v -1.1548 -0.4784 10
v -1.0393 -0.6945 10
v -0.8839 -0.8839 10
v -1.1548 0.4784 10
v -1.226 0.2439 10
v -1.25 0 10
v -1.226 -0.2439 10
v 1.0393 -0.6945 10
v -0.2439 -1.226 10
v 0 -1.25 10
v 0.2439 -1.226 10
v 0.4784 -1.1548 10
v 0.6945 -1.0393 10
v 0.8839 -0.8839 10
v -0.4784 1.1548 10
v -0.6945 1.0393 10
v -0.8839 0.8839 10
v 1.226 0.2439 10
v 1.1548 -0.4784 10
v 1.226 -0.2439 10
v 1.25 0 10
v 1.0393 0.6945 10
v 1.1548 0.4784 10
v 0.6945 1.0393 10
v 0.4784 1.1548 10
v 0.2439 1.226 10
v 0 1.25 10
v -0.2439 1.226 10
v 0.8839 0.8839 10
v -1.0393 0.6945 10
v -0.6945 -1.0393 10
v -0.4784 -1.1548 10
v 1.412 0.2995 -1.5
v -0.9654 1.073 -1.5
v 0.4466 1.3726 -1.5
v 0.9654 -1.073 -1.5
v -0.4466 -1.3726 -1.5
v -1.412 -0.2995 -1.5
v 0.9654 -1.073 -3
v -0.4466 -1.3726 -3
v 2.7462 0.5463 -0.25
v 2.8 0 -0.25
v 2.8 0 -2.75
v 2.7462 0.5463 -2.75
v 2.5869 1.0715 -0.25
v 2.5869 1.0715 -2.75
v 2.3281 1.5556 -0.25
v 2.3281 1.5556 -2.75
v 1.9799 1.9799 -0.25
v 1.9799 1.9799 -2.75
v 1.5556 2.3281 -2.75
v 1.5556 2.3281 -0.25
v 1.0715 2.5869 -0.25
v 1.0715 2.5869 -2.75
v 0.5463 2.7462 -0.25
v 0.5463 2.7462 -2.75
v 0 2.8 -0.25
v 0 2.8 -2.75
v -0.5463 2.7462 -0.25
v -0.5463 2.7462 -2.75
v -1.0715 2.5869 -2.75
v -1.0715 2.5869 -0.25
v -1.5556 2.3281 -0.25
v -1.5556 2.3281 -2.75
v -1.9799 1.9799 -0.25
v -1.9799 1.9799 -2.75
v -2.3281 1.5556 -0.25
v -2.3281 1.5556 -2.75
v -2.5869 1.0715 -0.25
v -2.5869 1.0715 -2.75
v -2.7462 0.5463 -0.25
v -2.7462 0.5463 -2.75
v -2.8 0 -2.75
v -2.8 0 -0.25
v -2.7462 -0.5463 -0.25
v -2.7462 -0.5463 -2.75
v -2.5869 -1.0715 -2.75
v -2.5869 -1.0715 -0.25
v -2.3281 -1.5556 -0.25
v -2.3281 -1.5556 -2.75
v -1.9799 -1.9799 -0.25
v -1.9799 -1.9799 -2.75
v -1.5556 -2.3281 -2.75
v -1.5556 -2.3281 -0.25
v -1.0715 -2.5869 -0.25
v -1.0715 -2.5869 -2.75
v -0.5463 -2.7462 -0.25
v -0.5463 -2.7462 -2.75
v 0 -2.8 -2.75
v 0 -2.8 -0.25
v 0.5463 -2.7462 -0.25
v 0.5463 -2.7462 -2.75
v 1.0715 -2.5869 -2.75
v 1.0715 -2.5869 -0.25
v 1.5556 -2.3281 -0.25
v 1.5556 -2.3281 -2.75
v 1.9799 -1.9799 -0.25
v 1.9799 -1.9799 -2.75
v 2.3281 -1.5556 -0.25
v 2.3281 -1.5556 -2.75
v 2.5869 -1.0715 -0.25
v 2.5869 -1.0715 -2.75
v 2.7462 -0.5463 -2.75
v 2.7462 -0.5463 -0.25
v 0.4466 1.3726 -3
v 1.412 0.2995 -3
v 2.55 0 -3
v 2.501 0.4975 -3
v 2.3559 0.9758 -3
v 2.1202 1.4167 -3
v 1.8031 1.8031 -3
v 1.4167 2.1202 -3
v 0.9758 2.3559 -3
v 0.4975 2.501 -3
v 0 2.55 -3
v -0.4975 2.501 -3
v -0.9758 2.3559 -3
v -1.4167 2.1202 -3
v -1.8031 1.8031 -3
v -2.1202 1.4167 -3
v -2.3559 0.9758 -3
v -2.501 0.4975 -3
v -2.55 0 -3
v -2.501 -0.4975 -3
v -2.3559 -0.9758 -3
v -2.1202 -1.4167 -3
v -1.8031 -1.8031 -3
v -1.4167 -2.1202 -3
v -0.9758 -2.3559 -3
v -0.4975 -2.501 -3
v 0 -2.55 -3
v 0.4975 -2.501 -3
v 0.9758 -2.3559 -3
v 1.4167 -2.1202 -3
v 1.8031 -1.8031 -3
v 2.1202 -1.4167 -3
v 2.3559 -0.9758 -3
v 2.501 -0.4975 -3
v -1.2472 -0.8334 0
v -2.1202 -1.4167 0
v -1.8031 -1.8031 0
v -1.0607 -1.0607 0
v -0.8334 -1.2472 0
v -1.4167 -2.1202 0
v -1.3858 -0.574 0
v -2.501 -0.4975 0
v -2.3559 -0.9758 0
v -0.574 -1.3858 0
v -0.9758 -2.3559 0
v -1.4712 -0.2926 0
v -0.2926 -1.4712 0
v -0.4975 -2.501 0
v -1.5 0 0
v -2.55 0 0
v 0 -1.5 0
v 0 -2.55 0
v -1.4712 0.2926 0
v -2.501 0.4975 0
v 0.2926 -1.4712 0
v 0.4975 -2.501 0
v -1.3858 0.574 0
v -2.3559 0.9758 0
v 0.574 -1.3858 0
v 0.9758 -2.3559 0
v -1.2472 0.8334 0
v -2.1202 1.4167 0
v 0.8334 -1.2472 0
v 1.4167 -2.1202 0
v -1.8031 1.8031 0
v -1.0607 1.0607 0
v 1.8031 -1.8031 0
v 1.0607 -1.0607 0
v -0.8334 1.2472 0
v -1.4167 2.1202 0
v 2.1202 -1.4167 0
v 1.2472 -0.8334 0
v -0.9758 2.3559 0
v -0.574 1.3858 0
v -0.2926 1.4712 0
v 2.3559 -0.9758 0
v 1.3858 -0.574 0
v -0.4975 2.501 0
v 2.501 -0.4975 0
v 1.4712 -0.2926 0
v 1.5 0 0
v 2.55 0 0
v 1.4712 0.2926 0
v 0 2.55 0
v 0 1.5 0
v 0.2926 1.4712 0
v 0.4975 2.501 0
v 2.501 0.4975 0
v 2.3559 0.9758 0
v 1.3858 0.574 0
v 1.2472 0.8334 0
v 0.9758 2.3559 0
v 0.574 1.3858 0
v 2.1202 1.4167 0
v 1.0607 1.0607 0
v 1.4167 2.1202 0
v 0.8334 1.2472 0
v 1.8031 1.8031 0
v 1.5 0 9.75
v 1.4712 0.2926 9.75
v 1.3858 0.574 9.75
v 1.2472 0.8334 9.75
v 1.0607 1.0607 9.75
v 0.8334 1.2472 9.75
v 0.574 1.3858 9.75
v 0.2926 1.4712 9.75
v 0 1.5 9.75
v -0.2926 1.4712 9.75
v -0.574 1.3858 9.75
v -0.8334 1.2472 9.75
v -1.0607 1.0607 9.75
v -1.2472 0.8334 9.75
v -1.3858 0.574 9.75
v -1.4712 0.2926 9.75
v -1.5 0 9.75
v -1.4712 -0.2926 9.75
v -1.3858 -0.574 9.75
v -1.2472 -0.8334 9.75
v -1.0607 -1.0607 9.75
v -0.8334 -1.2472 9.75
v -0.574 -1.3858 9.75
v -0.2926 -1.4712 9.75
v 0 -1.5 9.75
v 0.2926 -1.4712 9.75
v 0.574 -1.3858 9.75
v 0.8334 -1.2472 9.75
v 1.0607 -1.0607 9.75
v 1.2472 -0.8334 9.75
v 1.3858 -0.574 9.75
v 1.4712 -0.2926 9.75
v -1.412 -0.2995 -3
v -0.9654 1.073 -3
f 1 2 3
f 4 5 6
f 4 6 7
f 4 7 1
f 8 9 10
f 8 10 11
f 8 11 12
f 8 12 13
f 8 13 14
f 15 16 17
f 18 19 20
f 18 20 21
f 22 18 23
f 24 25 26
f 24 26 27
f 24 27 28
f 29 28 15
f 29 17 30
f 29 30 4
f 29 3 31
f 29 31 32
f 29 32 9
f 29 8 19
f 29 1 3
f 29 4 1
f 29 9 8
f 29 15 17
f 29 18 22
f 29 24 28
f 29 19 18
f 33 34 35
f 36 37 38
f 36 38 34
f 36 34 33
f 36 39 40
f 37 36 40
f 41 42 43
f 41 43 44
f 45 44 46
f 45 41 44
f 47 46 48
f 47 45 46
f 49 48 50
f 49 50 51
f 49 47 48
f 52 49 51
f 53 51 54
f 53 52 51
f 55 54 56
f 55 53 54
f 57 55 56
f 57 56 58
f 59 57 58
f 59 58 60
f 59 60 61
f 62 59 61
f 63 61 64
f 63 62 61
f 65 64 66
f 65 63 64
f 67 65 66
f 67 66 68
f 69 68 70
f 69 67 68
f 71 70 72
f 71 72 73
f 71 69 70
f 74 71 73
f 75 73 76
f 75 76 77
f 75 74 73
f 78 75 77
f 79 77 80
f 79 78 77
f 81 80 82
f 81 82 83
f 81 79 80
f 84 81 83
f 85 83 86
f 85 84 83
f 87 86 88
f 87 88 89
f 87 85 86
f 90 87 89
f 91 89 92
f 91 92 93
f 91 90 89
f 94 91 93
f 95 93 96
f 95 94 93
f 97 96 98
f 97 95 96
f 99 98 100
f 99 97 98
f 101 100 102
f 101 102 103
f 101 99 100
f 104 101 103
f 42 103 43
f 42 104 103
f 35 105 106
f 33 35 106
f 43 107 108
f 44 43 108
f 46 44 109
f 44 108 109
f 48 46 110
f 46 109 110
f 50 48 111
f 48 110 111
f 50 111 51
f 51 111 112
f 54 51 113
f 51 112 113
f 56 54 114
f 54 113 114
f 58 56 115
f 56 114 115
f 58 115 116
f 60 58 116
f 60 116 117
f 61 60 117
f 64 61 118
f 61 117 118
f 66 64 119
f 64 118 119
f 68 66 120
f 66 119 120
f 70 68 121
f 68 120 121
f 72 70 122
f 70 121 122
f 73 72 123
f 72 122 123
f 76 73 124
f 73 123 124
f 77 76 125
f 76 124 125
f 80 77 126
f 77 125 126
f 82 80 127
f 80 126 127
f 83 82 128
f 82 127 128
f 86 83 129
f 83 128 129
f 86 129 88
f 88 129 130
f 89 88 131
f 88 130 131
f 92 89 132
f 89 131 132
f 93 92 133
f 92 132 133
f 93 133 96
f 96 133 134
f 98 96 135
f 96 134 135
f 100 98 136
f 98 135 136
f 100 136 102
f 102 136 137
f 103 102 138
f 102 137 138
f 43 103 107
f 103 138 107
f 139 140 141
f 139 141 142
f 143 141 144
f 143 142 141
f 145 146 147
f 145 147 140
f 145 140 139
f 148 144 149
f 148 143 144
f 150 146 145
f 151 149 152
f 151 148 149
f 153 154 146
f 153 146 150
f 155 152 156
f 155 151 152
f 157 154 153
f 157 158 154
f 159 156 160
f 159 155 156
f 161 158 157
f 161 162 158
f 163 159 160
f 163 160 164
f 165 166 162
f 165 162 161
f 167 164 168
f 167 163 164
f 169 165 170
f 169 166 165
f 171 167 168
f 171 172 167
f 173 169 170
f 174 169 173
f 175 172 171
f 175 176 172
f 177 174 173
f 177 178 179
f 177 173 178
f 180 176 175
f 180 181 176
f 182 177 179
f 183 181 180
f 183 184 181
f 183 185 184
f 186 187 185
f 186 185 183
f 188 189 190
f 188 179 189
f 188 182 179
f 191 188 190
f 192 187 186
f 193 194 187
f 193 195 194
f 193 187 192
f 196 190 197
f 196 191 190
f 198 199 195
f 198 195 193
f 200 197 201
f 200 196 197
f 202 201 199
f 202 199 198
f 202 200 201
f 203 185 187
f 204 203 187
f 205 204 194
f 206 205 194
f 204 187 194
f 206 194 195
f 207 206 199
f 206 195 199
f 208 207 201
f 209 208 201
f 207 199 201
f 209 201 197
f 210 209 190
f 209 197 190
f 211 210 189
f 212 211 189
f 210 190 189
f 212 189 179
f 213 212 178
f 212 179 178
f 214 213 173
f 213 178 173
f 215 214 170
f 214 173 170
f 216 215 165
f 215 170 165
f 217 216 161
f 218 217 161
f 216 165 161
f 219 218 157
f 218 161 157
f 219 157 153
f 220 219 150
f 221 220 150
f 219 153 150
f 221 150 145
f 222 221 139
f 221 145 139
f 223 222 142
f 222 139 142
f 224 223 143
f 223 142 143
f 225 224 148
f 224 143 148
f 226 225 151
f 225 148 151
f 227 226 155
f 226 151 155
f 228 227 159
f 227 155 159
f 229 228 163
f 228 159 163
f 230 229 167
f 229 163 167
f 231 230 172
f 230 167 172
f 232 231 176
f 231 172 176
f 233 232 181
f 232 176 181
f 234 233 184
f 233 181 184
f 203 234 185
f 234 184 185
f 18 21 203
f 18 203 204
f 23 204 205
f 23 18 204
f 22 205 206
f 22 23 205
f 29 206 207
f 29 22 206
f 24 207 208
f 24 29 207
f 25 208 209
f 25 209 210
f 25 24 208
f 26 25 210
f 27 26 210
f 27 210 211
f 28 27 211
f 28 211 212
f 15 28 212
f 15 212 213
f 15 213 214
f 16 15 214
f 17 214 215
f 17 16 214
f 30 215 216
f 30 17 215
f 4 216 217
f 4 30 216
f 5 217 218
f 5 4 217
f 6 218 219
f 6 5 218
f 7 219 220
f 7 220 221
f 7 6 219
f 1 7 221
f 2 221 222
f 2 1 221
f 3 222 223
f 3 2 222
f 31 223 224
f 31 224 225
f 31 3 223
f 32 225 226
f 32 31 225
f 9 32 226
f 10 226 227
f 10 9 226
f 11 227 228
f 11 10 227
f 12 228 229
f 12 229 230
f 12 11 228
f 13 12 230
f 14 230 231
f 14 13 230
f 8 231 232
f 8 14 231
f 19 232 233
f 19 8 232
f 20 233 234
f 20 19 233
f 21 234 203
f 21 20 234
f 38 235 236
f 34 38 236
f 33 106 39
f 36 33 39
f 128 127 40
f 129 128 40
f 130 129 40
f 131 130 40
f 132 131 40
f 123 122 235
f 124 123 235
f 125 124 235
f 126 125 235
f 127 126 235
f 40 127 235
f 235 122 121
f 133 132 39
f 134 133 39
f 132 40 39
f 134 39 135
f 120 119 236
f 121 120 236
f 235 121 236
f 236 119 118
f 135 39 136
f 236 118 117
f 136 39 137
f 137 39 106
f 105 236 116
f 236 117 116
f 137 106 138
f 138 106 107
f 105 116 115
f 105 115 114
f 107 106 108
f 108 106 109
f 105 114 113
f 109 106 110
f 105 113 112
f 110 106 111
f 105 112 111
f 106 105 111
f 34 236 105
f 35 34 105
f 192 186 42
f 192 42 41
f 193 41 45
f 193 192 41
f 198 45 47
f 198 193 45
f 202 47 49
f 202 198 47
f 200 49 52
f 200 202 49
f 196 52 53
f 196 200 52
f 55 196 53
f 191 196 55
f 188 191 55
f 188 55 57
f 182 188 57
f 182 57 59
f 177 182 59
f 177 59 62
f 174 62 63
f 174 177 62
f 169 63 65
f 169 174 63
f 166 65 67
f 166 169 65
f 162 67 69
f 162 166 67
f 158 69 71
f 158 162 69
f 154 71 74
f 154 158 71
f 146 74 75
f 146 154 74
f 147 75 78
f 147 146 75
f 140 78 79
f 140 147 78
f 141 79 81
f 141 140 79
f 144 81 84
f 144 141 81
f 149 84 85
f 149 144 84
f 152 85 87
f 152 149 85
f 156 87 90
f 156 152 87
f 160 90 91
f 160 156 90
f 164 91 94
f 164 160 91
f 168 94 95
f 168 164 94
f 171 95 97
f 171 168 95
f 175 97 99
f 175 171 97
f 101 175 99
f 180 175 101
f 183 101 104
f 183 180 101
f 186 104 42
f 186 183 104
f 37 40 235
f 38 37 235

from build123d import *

# Parameters (mm, degrees)
F0_R     = 1.5
F1_DEPTH = 10
F2_R     = 2.8
F3_DEPTH = 3
F5_DEPTH = 1.5
F6_SIZE  = 0.25


with BuildPart() as f1:
    # F0 (on Top) → F1 (new body)
    with BuildSketch(Plane.XY):
        Circle(F0_R)
    extrude(amount=F1_DEPTH)

    # F2 (on Top) → F3 (join)
    with BuildSketch(Plane.XY):
        Circle(F2_R)
    extrude(amount=-F3_DEPTH)

    # F4 (on face) → F5 (cut)
    with BuildSketch(Plane(origin=(0, 0, -3), x_dir=(1, 0, 0), z_dir=(0, 0, -1))):
        Polygon((0.446582, -1.372552), (1.411956, -0.299524), (0.965373, 1.073027), (-0.446582, 1.372552), (-1.411956, 0.299524), (-0.965373, -1.073027), align=None)
    extrude(amount=-F5_DEPTH, mode=Mode.SUBTRACT)

    # F6
    f6_edges = [f1.edges().sort_by_distance(p)[0] for p in [
        (-2.8, 0, -3),
        (-1.5, 0, 10),
        (-2.8, 0, 0),
    ]]
    chamfer(f6_edges, length=F6_SIZE)


solid = f1.part
